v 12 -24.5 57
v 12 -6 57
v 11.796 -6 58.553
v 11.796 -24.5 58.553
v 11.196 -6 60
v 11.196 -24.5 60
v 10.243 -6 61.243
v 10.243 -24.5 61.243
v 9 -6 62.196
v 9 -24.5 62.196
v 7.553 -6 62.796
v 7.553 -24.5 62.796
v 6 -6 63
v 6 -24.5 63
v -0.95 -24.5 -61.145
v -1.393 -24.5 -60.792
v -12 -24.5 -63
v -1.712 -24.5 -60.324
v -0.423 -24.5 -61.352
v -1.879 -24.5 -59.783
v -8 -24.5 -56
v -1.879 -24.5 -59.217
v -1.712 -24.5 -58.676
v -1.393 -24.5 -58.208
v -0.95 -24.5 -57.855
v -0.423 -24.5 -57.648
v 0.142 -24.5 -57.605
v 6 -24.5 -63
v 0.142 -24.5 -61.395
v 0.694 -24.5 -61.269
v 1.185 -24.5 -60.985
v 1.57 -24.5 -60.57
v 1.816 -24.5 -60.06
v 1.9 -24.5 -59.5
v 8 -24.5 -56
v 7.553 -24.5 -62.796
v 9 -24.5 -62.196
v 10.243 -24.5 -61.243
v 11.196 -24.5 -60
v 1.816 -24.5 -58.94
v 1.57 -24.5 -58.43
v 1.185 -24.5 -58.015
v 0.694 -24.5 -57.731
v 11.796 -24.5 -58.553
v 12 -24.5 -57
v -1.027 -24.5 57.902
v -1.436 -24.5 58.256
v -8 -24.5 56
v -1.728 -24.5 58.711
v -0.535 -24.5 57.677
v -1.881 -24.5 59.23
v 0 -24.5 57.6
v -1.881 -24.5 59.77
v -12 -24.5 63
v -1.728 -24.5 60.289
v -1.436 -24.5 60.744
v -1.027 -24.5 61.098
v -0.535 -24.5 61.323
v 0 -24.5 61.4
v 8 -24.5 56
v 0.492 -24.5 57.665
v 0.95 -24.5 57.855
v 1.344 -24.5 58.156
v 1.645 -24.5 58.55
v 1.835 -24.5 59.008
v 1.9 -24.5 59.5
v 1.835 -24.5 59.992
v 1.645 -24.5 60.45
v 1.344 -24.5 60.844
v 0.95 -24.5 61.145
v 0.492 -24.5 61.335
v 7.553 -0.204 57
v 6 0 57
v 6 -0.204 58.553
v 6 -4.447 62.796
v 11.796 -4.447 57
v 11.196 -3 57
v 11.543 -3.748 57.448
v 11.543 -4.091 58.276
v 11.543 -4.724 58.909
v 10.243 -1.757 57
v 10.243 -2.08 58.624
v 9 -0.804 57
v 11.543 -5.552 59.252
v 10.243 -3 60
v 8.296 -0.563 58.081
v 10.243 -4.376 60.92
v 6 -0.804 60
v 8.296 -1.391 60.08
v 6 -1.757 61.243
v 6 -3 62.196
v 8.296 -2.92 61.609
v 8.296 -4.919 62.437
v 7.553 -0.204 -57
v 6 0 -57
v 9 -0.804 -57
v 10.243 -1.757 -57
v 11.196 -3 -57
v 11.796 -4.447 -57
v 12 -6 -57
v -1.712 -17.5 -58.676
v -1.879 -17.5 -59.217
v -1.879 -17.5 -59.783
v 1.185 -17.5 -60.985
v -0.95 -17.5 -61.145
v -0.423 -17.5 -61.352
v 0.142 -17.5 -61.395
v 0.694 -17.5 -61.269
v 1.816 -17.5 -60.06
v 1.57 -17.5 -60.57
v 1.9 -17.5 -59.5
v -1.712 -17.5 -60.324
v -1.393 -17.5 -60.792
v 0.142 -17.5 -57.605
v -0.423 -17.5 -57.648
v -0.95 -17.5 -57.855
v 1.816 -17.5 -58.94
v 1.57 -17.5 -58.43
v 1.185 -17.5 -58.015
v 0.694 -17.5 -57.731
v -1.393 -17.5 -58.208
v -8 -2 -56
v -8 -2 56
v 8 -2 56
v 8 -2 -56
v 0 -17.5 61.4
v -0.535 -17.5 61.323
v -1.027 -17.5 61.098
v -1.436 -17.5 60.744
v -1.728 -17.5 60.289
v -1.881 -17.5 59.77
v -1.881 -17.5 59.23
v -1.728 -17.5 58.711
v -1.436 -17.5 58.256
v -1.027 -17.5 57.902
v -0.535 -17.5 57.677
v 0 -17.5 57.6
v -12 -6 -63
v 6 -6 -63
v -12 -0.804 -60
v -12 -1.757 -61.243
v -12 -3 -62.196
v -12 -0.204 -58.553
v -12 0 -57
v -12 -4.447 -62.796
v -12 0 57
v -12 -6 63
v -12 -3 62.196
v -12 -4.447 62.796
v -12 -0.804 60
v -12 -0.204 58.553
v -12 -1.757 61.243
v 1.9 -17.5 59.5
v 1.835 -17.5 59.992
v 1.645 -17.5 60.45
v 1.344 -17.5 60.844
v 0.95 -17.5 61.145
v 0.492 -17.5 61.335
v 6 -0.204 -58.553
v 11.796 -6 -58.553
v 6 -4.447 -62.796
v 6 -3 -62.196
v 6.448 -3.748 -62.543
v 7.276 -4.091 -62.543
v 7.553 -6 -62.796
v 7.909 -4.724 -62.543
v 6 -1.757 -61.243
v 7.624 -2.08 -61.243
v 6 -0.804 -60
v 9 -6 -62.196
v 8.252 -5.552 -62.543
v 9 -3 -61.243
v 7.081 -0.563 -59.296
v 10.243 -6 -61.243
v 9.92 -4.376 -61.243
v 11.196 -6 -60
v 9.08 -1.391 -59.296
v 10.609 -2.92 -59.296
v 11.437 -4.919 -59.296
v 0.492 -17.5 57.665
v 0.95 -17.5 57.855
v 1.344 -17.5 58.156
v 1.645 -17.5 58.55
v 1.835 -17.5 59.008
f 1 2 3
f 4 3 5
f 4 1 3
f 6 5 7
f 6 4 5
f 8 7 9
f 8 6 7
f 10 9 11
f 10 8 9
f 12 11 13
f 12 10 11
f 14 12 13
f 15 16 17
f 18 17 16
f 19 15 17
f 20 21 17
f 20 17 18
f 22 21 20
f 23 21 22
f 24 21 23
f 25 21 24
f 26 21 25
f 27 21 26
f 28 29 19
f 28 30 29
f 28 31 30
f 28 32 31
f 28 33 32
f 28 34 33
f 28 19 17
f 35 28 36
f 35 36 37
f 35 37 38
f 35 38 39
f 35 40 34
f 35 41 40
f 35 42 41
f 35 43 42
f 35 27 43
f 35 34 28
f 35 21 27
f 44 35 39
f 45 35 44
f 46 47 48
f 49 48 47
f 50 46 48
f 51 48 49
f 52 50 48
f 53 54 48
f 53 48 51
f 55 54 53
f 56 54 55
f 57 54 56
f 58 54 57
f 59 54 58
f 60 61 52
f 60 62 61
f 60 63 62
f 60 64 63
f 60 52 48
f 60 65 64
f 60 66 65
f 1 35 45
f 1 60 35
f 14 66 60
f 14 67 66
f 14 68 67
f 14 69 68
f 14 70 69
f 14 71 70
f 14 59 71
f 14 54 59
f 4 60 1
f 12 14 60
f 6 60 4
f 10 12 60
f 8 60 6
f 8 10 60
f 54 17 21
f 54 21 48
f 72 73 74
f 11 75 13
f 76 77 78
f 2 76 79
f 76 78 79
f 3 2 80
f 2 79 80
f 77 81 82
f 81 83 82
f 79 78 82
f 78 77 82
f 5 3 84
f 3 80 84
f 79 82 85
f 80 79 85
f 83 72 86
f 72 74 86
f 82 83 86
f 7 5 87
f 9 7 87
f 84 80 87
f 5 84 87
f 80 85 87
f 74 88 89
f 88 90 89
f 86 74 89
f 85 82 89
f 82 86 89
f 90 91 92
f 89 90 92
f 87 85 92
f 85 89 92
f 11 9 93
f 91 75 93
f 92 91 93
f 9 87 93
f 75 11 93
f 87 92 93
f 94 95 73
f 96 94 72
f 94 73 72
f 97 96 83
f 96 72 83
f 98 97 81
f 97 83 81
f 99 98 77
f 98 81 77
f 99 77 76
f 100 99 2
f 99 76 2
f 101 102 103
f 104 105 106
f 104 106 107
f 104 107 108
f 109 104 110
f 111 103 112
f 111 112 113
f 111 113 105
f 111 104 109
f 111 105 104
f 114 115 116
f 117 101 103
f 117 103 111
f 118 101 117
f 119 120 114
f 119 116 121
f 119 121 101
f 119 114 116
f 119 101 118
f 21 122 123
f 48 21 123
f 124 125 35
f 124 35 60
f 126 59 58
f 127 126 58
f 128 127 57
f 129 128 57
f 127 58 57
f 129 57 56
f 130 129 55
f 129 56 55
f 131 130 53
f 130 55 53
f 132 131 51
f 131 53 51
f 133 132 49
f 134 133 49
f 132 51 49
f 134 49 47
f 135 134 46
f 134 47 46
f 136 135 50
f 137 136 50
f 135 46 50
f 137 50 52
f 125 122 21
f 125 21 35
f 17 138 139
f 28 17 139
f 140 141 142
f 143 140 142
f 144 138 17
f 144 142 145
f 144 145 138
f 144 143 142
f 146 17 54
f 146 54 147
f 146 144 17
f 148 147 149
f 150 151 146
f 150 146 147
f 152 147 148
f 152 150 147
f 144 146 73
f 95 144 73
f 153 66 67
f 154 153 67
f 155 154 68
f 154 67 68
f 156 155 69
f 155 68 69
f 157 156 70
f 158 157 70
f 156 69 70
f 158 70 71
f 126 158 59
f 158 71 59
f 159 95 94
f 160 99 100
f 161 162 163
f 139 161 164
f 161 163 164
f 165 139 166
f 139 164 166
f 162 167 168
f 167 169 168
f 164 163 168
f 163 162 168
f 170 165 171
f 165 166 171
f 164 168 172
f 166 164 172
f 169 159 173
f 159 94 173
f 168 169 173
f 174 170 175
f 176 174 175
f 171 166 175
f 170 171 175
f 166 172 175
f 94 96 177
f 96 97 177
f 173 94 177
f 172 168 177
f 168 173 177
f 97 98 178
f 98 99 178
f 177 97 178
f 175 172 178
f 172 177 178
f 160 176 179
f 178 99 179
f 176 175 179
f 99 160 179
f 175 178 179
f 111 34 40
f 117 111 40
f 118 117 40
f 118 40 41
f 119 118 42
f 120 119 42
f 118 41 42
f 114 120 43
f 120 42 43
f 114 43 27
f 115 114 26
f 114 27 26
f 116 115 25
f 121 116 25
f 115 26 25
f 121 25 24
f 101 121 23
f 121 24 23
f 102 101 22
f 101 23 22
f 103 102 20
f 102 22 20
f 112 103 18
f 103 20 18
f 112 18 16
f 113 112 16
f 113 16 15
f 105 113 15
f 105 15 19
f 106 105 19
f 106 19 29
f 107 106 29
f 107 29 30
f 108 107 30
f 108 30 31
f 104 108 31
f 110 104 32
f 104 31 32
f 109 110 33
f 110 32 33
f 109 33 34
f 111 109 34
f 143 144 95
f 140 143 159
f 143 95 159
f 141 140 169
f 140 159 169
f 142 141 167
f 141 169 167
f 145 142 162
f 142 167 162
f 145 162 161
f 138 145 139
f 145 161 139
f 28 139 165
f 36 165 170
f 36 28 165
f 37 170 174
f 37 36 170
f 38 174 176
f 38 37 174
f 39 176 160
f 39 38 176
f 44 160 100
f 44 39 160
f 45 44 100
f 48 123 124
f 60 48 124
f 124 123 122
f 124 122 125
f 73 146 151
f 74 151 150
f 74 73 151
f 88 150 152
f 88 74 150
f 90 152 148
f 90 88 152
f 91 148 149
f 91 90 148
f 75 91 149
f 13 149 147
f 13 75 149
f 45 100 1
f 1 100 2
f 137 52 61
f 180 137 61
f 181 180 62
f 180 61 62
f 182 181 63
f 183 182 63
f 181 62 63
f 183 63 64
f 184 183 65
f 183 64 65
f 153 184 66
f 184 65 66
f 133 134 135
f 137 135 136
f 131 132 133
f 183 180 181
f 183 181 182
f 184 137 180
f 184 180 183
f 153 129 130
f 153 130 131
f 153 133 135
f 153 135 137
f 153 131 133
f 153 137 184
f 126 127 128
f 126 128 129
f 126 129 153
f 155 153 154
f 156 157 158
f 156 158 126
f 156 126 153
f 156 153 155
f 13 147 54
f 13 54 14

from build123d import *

# Parameters (mm, degrees)
F0_W     = 24
F0_H     = 126
F0_W_2   = 16
F0_H_2   = 112
F1_DEPTH = 24.5
F2_DEPTH = 2
F3_R     = 1.9
F4_DEPTH = 7
F5_R     = 6


with BuildPart() as f1:
    # F0 (on Front) → F1 (new body)
    with BuildSketch(Plane.XZ):
        Rectangle(F0_W, F0_H)
        Rectangle(F0_W_2, F0_H_2, mode=Mode.SUBTRACT)
    extrude(amount=F1_DEPTH)

    # F0 (on Front) → F2 (join)
    with BuildSketch(Plane.XZ):
        Rectangle(F0_W_2, F0_H_2)
    extrude(amount=F2_DEPTH)

    # F3 (on face) → F4 (cut)
    with BuildSketch(Plane.XZ.offset(24.5)):
        with BuildLine():
            ThreePointArc((0, 57.6), (1.343503, 58.156497), (1.9, 59.5))
            ThreePointArc((1.9, 59.5), (1.343503, 60.843503), (0, 61.4))
            Line((0, 61.4), (0, 57.6))
        make_face()
        with BuildLine():
            Line((0, 57.6), (0, 61.4))
            ThreePointArc((0, 61.4), (-1.9, 59.5), (0, 57.6))
        make_face()
        with Locations((0, -59.5)):
            Circle(F3_R)
    extrude(amount=-F4_DEPTH, mode=Mode.SUBTRACT)

    # F5
    f5_edges = [f1.edges().sort_by_distance(p)[0] for p in [
        (0, 0, 63),
        (12, 0, 0),
        (0, 0, -63),
        (12, -12.25, -63),
        (12, -12.25, 63),
    ]]
    fillet(f5_edges, radius=F5_R)


solid = f1.part
